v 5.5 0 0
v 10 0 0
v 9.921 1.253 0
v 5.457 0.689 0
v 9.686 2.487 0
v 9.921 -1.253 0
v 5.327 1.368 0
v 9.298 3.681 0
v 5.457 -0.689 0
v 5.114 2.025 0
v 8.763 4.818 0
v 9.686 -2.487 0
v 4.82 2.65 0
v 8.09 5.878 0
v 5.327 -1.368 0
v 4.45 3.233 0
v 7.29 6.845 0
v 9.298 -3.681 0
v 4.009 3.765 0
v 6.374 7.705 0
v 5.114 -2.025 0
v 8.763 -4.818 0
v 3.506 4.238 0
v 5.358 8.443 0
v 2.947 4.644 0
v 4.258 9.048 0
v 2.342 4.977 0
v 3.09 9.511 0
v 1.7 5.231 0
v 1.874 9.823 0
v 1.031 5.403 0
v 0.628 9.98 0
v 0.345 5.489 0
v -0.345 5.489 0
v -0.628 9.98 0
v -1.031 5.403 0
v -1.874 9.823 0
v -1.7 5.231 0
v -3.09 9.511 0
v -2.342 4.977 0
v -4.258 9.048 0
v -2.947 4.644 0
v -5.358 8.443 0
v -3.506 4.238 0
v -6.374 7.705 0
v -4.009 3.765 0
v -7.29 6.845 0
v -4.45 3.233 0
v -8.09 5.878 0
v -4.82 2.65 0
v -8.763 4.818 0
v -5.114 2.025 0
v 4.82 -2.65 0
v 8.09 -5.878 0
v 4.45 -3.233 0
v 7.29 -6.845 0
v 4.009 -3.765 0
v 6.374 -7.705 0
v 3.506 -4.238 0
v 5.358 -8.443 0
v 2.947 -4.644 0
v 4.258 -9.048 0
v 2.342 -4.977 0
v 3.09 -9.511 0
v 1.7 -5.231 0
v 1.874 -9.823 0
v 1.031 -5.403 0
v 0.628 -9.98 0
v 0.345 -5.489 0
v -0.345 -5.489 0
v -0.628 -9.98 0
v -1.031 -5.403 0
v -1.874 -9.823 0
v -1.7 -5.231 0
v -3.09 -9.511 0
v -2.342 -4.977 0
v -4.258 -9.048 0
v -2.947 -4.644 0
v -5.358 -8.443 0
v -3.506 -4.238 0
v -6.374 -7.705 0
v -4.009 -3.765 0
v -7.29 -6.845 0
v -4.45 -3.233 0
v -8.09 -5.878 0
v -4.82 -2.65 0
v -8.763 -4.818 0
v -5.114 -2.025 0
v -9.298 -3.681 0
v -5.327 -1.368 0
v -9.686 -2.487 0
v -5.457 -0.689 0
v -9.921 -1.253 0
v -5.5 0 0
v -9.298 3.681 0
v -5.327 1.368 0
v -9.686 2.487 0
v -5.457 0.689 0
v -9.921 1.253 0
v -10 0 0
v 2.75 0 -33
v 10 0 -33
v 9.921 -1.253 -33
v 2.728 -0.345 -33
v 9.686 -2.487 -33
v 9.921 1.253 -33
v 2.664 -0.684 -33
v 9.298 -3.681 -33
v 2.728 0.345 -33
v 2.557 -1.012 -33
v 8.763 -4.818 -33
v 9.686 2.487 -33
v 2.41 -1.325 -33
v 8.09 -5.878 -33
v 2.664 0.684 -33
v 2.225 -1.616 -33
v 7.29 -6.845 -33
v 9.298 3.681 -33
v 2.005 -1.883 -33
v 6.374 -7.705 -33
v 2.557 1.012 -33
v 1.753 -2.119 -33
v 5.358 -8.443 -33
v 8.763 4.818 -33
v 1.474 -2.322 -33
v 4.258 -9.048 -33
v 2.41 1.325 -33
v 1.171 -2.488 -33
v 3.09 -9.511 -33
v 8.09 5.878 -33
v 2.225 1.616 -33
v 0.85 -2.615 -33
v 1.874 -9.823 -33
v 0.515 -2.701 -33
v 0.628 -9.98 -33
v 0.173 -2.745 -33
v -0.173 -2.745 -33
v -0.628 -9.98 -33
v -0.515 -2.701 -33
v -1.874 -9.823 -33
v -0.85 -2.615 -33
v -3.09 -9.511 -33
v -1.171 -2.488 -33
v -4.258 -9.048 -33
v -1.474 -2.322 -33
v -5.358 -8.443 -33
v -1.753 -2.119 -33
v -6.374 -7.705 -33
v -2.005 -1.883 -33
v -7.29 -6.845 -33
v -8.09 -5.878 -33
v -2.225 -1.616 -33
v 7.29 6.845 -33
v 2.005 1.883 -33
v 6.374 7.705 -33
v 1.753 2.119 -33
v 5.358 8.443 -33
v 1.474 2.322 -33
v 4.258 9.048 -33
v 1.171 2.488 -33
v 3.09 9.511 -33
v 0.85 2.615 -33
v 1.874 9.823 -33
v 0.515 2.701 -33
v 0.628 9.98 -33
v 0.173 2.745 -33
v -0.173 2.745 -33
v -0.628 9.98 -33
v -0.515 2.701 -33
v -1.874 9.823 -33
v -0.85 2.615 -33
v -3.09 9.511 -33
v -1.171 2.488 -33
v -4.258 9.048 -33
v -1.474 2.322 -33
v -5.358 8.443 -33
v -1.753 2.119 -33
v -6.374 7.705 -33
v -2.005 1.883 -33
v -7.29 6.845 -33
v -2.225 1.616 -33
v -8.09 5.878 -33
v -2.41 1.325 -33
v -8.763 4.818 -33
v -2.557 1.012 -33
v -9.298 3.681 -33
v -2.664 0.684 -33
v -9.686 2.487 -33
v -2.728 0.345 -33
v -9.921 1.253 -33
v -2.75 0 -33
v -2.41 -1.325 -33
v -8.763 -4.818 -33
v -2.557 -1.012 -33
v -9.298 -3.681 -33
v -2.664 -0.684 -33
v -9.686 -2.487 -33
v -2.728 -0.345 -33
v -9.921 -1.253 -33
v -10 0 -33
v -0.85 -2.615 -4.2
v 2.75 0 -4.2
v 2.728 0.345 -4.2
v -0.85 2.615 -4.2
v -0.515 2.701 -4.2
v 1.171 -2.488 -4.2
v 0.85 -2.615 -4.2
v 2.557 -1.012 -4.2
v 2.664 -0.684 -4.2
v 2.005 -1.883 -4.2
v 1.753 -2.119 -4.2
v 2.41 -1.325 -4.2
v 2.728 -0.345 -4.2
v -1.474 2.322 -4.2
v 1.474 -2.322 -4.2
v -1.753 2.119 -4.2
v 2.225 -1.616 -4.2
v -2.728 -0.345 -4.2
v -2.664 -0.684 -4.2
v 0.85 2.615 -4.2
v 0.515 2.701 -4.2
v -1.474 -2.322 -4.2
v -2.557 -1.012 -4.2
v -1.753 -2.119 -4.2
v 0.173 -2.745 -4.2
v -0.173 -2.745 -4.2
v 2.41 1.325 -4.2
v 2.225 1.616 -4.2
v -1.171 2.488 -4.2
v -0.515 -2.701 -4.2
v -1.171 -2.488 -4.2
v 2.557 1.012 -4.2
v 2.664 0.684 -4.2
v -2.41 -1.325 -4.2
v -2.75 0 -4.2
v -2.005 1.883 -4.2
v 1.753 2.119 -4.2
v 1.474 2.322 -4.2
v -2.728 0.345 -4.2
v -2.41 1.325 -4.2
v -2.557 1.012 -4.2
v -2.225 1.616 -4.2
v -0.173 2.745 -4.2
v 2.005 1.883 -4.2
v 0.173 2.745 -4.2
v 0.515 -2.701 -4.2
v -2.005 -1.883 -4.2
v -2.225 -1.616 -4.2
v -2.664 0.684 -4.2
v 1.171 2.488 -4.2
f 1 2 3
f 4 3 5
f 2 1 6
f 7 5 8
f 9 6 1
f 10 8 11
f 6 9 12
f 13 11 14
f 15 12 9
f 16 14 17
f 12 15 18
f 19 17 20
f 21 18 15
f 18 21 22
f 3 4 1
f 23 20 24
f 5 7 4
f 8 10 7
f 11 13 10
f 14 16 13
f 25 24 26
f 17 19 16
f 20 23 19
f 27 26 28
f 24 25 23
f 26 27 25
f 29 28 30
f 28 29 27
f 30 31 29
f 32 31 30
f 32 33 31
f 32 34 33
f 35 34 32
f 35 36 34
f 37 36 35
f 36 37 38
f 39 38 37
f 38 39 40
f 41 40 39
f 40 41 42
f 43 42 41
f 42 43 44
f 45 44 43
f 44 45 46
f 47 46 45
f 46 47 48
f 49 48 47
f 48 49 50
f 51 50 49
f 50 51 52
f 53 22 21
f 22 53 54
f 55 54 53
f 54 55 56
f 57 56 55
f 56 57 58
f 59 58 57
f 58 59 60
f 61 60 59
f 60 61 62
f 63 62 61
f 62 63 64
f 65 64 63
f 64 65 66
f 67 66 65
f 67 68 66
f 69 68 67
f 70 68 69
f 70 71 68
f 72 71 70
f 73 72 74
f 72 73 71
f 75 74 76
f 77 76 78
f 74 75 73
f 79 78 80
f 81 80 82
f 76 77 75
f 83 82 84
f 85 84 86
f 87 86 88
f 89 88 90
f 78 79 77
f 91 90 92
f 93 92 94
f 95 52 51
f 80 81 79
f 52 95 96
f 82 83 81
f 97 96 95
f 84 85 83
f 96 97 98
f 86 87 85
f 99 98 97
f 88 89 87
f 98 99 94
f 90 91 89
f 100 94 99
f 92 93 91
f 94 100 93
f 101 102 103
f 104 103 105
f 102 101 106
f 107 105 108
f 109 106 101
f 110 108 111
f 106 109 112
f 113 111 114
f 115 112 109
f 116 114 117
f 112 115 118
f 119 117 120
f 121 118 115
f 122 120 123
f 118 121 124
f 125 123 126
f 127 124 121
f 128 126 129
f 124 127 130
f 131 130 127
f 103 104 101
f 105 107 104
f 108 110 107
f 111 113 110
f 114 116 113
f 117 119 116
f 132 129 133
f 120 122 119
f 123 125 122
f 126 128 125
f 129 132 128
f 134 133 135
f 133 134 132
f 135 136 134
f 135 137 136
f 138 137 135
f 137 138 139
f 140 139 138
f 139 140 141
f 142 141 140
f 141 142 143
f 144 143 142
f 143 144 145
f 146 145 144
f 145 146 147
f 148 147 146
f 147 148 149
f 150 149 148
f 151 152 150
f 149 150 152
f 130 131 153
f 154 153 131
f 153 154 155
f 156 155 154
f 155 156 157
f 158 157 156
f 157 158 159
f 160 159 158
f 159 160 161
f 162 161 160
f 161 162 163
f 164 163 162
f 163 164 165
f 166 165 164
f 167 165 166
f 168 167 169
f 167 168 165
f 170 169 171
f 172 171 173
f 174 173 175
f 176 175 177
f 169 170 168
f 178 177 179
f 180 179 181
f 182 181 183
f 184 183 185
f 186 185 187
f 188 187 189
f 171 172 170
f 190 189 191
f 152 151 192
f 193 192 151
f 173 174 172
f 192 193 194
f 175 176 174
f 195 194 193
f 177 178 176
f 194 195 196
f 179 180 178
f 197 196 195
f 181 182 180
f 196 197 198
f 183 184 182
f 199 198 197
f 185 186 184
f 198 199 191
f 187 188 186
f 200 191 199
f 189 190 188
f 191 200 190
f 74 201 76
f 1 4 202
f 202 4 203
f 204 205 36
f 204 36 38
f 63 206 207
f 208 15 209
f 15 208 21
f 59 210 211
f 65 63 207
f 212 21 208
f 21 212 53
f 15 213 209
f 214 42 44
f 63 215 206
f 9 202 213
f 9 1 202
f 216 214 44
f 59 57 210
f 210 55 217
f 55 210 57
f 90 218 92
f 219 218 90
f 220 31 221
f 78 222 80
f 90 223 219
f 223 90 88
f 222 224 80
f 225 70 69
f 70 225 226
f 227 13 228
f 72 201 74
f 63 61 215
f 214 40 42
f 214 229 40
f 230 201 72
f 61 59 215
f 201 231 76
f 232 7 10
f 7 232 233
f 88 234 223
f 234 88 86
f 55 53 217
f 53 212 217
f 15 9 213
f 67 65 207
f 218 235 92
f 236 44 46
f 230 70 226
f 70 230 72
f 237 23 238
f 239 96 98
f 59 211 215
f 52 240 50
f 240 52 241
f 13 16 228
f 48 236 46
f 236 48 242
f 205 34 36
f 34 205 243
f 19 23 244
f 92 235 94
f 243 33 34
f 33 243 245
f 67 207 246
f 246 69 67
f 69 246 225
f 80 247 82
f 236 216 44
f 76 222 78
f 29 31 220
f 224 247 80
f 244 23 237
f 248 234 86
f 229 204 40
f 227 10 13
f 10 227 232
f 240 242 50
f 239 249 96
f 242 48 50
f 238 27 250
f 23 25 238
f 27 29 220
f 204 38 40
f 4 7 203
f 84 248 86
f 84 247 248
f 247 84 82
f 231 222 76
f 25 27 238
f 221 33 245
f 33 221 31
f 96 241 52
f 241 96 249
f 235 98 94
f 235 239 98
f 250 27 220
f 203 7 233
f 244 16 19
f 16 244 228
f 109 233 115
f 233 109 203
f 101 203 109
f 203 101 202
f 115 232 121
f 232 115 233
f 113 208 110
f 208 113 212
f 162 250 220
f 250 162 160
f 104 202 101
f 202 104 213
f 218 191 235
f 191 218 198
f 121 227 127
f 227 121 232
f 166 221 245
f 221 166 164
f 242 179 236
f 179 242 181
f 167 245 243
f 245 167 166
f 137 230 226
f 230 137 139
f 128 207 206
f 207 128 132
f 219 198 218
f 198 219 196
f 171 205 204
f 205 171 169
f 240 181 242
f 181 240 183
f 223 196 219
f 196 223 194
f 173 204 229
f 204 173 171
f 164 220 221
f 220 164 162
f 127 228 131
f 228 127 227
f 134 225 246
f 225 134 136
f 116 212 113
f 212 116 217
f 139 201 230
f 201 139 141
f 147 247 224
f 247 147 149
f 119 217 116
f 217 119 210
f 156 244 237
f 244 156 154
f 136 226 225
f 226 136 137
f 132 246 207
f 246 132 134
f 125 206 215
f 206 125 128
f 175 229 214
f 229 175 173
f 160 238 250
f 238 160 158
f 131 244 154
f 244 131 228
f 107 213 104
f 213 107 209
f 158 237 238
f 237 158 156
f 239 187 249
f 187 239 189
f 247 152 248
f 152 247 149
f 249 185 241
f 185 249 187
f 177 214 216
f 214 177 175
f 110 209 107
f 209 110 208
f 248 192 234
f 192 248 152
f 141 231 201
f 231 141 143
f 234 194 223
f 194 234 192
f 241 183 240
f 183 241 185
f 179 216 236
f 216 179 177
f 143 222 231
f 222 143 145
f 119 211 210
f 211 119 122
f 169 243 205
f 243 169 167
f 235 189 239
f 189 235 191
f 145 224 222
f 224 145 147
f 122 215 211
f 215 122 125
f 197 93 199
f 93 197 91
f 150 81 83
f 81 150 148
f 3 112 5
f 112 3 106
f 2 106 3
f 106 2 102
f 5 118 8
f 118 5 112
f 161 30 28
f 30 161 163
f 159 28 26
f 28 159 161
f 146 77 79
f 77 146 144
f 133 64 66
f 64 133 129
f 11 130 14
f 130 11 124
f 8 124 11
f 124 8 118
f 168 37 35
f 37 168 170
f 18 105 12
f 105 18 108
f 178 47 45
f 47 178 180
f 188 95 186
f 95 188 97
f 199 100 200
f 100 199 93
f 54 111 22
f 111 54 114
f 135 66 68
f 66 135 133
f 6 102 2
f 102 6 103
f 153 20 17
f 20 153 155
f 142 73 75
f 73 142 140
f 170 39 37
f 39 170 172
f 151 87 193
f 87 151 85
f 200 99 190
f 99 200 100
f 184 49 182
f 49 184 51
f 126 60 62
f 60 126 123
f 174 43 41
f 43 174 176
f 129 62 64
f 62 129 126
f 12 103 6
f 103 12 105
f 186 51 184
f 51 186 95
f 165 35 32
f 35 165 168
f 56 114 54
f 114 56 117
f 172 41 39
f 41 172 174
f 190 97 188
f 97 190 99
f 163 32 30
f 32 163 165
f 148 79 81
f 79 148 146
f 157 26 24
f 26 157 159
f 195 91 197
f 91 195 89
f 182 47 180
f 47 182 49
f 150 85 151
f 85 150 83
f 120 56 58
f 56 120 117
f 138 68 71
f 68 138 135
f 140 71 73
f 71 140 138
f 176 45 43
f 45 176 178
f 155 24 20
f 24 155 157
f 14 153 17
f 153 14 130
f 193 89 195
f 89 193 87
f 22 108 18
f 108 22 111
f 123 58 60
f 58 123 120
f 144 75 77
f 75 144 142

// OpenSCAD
$fn = 50;


difference() {
	union() {
		translate(v = [0, 0, -33.0000000000]) {
			cylinder(h = 33, r = 10.0000000000);
		}
		cylinder(h = 0, r = 19.0000000000);
	}
	union() {
		translate(v = [0, 0, 0]) {
			rotate(a = [0, 0, 0]) {
				difference() {
					union() {
						#translate(v = [0, 0, -33.0000000000]) {
							cylinder(h = 33, r = 2.2500000000);
						}
						#translate(v = [0, 0, -4.2000000000]) {
							cylinder(h = 4.2000000000, r = 10.0000000000, r1 = 2.7500000000, r2 = 5.5000000000);
						}
						#translate(v = [0, 0, -33.0000000000]) {
							cylinder(h = 33, r = 2.7500000000);
						}
						#translate(v = [0, 0, -33.0000000000]) {
							cylinder(h = 33, r = 2.2500000000);
						}
					}
					union();
				}
			}
		}
	}
}
